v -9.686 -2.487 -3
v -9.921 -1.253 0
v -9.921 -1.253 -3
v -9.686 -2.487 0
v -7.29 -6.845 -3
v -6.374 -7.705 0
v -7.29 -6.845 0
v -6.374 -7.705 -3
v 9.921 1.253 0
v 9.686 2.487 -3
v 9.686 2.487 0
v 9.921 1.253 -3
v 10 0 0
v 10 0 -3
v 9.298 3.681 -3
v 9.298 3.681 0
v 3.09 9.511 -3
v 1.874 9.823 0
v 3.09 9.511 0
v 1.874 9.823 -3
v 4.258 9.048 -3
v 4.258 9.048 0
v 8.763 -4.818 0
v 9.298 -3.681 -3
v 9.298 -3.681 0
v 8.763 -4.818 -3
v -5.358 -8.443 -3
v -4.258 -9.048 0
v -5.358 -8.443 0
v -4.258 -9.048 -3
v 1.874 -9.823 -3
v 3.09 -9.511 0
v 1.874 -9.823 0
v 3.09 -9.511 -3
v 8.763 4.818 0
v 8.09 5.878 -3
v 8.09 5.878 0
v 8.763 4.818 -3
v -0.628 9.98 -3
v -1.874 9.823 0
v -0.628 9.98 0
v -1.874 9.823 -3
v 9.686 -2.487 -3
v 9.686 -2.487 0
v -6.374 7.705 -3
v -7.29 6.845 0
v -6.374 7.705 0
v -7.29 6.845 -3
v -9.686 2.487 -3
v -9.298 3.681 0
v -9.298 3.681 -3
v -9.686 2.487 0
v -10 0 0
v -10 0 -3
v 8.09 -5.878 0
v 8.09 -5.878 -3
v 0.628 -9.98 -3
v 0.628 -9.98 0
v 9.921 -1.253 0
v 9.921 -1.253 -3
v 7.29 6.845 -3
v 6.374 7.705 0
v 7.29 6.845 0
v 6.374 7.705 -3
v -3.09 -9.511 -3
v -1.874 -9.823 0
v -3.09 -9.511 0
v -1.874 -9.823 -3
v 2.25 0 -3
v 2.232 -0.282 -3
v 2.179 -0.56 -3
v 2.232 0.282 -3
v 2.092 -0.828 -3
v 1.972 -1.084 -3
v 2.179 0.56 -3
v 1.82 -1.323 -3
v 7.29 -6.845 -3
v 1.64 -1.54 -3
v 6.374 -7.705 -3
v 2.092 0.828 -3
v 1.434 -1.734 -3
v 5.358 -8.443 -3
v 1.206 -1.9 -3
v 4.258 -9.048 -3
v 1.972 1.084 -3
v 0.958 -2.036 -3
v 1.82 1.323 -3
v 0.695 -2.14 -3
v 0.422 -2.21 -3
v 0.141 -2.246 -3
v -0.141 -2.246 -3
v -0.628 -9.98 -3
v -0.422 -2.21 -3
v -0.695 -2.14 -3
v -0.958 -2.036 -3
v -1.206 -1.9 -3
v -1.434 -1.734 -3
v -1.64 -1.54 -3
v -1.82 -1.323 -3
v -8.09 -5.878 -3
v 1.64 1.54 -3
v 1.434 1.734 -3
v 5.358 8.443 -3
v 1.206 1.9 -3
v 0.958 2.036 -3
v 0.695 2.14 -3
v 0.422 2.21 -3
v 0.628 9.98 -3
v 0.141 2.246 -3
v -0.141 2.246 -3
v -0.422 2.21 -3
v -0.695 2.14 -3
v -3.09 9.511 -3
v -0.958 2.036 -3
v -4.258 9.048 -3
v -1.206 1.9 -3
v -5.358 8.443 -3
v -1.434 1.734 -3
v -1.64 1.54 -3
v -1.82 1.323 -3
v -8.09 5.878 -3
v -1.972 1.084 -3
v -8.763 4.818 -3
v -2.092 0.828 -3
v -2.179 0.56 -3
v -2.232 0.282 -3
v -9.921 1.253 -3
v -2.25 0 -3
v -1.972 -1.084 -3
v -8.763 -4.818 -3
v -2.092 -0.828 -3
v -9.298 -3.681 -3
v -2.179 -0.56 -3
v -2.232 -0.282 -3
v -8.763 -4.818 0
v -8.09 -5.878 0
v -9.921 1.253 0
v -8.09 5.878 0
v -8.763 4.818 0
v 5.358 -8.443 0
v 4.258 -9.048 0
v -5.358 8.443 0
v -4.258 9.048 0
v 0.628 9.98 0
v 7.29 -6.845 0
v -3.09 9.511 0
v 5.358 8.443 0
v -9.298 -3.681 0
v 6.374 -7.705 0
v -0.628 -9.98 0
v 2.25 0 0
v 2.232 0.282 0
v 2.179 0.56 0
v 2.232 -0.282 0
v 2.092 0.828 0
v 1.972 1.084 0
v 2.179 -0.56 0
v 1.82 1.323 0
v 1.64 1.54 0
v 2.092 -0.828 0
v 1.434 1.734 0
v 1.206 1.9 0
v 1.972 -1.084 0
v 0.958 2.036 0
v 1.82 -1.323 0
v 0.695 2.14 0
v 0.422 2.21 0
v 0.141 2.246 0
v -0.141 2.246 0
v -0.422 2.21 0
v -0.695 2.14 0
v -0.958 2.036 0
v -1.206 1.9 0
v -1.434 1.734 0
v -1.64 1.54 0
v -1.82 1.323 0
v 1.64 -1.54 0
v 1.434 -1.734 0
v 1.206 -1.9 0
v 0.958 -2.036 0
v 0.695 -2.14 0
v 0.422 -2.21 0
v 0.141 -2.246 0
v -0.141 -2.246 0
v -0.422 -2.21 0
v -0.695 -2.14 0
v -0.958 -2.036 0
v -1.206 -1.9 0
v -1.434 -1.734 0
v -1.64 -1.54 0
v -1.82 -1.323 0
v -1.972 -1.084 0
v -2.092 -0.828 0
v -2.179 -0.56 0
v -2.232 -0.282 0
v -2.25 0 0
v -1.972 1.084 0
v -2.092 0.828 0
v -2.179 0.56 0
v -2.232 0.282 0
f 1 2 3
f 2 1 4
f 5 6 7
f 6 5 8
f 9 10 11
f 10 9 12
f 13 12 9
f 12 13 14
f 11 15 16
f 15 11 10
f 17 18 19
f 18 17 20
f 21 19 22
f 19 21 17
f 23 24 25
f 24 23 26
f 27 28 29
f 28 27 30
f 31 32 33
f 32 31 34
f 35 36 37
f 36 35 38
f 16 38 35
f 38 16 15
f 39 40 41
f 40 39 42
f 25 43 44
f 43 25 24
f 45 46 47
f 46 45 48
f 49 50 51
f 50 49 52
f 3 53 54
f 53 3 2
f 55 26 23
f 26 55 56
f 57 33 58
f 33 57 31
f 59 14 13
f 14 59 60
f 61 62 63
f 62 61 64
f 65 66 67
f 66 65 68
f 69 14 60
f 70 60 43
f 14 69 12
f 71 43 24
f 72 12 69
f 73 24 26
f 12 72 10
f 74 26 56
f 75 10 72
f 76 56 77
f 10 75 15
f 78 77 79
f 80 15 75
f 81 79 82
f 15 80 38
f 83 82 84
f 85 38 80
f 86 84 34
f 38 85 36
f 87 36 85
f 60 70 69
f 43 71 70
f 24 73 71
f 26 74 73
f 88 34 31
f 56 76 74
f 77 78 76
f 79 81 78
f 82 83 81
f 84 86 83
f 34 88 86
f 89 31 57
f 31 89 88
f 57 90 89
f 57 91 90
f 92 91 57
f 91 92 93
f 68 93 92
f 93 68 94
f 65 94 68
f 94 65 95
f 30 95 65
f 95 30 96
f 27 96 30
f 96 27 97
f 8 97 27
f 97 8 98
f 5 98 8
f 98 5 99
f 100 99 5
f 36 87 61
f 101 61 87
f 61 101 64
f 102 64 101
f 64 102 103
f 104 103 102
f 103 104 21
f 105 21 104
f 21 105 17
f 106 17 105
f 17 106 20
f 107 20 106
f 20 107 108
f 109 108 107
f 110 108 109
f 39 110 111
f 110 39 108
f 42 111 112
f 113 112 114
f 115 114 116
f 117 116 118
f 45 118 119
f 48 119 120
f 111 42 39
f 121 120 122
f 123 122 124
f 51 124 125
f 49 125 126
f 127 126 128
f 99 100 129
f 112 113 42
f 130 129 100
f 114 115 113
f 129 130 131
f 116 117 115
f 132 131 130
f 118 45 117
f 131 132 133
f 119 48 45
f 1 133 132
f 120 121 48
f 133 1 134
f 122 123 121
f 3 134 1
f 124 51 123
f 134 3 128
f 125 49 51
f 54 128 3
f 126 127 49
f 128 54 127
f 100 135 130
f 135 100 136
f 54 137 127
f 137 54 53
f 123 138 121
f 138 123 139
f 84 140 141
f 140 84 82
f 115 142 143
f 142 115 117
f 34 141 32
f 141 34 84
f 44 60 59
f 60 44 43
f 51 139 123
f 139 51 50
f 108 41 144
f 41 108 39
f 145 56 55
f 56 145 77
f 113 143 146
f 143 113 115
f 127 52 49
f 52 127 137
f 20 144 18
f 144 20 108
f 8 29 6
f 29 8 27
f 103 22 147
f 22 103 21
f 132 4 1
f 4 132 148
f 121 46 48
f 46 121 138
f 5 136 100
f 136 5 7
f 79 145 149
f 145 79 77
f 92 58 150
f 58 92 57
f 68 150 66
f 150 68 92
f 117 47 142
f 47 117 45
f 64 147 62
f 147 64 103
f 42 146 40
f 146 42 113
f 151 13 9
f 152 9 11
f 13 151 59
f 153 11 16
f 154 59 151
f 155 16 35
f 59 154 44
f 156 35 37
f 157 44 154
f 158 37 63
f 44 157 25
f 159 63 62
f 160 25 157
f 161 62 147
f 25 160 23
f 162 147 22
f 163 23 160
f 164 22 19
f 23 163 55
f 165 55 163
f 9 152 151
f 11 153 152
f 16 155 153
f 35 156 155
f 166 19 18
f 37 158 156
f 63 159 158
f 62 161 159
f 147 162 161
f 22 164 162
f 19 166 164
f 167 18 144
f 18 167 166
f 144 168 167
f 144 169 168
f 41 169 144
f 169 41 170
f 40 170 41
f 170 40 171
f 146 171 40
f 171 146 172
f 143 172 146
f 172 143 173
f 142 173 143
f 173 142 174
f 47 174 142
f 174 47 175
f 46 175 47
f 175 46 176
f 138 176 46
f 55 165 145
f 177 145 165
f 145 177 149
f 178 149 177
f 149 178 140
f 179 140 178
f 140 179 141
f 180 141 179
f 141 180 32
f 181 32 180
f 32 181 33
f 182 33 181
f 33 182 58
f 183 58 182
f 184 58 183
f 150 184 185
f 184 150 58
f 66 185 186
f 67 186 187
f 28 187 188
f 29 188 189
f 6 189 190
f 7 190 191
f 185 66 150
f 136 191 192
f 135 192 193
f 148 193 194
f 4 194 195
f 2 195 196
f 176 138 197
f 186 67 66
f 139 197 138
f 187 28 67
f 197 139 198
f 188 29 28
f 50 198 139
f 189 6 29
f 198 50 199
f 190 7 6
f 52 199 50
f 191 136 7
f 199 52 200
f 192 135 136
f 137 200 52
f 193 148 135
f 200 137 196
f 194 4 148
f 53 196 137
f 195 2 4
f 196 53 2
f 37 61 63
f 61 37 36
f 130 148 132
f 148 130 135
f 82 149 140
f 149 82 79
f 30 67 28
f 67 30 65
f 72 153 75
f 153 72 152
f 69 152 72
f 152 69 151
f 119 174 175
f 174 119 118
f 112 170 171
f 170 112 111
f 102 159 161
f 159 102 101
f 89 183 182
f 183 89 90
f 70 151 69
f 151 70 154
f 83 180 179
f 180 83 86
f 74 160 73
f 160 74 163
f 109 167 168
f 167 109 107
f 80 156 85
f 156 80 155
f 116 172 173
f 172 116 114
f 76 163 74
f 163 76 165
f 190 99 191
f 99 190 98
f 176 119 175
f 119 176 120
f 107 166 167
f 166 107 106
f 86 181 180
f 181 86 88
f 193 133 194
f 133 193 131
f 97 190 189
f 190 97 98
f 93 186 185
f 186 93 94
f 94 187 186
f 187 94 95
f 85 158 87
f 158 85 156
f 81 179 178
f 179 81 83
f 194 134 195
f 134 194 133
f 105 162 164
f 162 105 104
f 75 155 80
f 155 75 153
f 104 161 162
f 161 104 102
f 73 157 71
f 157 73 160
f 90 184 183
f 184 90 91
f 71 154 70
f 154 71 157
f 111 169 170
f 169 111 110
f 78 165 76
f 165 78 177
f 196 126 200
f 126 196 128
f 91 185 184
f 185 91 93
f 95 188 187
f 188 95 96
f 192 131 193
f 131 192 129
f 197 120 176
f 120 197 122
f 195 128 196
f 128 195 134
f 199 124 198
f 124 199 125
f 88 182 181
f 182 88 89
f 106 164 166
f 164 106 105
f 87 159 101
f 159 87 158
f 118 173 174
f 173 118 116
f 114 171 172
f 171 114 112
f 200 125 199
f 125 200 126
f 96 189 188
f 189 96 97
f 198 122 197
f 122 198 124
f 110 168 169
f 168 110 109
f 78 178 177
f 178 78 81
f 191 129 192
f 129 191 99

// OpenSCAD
$fn = 50;


difference() {
	union() {
		translate(v = [0, 0, -3.0000000000]) {
			cylinder(h = 3, r = 10.0000000000);
		}
		cylinder(h = 0, r = 20.0000000000);
	}
	union() {
		#translate(v = [0, 0, -3]) {
			cylinder(h = 3, r = 2.2500000000);
		}
	}
}
